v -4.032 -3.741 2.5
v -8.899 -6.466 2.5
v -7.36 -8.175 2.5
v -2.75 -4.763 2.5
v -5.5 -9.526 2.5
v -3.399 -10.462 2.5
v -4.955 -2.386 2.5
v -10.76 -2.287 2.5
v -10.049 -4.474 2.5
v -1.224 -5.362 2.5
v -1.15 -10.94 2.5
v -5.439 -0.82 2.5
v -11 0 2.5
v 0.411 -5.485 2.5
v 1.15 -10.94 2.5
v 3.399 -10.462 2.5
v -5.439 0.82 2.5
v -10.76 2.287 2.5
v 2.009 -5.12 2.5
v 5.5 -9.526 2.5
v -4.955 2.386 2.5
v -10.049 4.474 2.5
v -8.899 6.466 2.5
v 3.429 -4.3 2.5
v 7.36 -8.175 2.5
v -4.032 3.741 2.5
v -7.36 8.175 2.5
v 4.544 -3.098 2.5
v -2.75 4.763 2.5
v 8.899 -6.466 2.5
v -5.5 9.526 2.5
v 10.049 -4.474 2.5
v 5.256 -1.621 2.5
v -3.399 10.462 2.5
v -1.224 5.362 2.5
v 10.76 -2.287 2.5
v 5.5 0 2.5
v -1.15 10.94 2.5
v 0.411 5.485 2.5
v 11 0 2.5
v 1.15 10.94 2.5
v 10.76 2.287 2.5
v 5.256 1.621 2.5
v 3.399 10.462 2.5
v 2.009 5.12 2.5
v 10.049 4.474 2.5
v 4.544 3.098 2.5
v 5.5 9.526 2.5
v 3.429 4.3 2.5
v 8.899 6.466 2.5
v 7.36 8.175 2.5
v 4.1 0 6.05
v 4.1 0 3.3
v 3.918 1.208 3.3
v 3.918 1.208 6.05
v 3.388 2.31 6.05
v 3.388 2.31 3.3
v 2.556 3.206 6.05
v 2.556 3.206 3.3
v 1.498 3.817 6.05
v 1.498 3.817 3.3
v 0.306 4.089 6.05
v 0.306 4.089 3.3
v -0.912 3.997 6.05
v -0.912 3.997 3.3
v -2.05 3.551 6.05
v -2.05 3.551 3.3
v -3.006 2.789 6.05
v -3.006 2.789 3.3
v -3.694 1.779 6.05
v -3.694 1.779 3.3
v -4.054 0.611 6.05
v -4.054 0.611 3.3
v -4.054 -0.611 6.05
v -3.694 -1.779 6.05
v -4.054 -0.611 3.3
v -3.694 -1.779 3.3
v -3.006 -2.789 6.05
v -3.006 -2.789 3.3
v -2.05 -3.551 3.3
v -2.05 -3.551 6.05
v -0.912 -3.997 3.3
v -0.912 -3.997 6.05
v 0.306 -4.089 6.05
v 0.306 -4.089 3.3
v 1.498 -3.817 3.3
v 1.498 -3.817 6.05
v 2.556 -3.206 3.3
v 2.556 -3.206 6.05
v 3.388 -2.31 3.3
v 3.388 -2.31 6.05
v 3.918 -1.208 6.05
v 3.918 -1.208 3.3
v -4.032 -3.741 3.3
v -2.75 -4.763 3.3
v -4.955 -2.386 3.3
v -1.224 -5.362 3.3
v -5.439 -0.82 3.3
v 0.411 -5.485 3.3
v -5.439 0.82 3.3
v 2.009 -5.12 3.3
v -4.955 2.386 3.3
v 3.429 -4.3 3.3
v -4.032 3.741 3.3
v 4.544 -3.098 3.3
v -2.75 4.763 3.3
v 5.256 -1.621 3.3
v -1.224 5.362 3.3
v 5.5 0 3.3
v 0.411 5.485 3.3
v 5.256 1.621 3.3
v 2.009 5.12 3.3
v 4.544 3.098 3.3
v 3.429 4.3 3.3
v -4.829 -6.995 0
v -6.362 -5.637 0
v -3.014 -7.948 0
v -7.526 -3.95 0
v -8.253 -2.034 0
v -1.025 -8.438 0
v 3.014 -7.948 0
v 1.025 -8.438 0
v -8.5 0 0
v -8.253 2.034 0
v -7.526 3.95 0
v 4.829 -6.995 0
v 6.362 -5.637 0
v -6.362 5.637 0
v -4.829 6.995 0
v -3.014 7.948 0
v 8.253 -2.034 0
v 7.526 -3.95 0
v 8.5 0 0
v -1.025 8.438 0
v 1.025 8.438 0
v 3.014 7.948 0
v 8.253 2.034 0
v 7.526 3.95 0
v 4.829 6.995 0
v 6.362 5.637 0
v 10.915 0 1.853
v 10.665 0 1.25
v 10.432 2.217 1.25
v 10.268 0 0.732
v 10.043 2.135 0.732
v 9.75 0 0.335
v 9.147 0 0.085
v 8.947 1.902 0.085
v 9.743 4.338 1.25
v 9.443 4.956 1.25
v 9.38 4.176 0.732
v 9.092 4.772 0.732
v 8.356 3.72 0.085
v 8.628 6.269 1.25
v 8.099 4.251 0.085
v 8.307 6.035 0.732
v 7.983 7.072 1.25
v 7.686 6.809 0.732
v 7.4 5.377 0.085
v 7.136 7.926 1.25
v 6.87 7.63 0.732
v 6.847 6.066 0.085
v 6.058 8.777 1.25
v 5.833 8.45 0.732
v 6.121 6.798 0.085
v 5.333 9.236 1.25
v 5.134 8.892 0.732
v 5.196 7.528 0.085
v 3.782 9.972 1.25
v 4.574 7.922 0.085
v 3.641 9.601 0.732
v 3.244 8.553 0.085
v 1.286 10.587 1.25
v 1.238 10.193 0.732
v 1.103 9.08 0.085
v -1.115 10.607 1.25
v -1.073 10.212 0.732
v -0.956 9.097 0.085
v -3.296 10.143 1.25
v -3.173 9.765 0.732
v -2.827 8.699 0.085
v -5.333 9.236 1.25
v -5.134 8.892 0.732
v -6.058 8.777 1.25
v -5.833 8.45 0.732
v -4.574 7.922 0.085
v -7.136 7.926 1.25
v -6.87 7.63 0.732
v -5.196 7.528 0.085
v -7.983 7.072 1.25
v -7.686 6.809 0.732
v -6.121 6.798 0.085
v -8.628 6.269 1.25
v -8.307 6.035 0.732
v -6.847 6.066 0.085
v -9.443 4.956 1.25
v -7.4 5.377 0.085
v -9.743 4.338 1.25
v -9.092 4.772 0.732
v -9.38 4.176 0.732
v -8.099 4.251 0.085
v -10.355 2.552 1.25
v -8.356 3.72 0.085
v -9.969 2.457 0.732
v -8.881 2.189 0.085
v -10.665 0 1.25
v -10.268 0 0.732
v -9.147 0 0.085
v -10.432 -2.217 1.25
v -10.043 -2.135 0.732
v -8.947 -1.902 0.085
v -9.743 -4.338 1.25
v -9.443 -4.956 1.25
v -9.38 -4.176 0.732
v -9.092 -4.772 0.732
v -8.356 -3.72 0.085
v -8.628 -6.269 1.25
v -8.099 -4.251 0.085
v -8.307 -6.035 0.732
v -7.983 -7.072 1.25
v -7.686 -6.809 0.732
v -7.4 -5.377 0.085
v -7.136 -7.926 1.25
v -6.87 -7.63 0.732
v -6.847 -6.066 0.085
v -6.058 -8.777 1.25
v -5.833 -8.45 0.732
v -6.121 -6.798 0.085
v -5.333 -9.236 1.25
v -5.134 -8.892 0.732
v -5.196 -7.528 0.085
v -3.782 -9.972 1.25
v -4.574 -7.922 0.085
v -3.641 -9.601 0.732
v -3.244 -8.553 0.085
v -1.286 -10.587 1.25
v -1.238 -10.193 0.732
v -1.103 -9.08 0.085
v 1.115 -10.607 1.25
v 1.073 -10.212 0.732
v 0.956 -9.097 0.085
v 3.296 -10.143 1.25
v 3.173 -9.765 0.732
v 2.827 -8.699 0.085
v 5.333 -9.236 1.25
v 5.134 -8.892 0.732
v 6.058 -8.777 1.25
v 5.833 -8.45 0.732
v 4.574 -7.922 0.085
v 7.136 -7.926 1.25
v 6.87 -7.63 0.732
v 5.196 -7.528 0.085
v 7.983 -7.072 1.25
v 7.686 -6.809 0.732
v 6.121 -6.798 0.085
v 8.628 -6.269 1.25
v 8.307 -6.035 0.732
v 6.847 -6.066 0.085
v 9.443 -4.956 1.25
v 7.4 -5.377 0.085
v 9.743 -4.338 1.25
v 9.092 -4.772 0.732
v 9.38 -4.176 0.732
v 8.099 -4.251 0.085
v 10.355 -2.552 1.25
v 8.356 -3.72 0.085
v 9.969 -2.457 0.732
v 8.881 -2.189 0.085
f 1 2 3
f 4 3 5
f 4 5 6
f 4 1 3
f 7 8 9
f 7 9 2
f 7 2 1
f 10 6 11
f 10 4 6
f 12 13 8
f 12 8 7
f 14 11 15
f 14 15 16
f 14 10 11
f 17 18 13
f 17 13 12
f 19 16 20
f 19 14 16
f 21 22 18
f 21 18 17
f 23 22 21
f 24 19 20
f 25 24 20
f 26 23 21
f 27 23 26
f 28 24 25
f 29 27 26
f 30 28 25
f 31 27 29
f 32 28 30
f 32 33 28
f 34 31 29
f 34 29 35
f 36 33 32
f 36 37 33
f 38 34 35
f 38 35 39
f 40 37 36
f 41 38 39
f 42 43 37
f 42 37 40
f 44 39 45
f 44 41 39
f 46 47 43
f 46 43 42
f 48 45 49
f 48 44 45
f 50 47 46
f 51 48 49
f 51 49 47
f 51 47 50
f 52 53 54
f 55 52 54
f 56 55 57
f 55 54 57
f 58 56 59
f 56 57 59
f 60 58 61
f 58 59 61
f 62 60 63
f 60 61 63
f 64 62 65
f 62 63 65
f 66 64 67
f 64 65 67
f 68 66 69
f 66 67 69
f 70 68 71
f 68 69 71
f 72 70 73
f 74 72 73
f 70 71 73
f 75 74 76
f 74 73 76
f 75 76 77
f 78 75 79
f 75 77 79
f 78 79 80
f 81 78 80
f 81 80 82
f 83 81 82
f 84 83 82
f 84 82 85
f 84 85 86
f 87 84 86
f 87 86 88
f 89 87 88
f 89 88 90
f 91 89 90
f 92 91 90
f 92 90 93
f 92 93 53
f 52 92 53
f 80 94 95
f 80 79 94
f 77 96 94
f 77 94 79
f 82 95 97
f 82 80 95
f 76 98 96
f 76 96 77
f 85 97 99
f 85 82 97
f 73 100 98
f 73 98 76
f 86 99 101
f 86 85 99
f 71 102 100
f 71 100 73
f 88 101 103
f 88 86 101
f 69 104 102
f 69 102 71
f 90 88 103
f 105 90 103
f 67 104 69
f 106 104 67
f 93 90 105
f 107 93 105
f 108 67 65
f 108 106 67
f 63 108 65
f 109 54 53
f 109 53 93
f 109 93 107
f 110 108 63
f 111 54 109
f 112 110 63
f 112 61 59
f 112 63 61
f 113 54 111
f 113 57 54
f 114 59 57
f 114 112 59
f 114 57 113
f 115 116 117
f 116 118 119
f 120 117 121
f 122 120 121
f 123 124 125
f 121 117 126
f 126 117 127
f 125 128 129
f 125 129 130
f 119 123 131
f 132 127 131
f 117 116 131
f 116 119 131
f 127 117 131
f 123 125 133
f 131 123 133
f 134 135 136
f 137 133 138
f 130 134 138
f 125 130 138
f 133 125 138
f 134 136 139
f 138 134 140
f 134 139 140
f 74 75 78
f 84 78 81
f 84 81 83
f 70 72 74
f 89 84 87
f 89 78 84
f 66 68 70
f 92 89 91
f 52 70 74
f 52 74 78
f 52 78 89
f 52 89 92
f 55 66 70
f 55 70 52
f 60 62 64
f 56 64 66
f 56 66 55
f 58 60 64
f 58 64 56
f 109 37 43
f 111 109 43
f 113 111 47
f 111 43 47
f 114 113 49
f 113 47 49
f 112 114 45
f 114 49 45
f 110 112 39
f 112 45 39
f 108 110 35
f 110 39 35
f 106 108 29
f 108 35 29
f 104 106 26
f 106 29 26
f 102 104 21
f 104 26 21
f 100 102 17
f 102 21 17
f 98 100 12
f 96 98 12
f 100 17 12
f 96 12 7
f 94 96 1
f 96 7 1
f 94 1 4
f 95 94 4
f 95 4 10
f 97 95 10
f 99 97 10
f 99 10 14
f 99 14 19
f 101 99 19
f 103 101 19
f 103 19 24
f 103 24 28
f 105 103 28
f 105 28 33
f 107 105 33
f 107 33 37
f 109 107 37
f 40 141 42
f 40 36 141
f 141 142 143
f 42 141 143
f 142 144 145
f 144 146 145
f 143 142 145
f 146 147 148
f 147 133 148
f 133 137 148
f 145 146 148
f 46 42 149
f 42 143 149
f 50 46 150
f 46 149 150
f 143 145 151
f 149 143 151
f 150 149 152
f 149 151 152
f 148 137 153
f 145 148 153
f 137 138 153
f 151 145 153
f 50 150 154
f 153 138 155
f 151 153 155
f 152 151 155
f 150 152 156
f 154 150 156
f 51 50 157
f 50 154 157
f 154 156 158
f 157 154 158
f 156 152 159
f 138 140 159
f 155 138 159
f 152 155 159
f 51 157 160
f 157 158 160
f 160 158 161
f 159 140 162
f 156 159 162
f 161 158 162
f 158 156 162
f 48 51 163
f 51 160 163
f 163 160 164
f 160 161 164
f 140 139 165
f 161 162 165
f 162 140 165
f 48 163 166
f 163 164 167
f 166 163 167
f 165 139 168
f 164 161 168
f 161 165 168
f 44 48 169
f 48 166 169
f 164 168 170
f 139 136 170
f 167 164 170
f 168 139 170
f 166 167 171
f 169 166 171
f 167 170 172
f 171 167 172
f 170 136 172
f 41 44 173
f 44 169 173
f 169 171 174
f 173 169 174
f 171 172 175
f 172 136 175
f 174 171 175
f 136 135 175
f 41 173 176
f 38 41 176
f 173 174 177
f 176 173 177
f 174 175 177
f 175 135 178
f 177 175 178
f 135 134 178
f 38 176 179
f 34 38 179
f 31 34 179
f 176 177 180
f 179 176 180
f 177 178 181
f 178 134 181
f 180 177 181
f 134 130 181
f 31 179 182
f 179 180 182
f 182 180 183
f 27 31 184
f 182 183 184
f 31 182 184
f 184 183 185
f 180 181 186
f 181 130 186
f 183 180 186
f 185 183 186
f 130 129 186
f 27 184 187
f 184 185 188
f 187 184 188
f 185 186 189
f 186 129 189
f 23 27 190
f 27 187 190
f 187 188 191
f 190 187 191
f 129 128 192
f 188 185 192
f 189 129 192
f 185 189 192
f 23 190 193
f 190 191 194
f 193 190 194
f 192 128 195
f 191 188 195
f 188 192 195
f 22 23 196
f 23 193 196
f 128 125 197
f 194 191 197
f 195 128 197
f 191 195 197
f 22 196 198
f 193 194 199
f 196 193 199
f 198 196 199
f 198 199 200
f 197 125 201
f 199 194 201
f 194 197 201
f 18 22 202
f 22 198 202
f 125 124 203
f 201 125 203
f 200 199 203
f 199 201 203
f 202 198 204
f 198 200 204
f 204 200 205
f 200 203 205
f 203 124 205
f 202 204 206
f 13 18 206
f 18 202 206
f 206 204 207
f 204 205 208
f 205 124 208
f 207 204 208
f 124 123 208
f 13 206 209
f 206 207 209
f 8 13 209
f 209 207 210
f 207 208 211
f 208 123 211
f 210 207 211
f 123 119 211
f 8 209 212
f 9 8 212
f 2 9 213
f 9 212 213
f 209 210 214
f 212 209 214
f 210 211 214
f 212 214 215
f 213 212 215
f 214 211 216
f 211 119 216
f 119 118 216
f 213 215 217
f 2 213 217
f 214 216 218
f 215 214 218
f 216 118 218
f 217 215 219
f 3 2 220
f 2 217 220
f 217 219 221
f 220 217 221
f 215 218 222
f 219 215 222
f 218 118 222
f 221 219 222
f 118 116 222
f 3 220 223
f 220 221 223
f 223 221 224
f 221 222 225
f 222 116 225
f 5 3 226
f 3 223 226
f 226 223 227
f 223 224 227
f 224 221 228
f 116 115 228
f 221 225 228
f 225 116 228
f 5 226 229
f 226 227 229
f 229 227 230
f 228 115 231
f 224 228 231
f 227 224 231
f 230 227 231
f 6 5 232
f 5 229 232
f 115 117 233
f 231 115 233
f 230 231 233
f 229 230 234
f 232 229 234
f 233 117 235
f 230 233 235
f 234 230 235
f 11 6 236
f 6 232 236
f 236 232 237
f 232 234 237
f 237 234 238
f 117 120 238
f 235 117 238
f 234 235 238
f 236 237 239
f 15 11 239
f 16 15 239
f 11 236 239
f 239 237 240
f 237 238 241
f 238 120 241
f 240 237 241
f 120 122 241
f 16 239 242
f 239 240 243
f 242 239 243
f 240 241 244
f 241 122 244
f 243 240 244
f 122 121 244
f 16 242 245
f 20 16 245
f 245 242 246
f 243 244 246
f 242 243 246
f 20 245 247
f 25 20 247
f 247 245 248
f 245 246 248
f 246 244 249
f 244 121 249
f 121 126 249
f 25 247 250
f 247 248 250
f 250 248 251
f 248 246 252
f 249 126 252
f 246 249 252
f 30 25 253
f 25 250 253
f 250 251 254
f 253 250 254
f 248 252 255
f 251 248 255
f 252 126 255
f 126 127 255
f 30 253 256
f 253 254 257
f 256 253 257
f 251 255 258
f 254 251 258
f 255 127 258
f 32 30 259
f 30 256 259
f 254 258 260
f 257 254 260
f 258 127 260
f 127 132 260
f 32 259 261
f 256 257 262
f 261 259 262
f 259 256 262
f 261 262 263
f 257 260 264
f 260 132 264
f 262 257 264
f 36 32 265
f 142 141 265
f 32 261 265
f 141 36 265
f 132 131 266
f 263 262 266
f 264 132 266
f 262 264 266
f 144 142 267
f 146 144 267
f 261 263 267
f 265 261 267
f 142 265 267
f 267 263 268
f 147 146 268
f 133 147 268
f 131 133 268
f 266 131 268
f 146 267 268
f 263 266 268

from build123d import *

# Parameters (mm, degrees)
F0_R     = 11
F0_R_2   = 5.5
F1_DEPTH = 2.5
F0_R_3   = 4.1
F2_DEPTH = 3.3
F3_DEPTH = 6.05
F4_R     = 2.49999


# Not quite as in the source:
# - a fillet or chamfer is up to 0.001 mm smaller than in the source, because OpenCascade refuses the exact size


with BuildPart() as f1:
    # F0 (on Top) → F1 (new body)
    with BuildSketch(Plane.XY):
        Circle(F0_R)
        Circle(F0_R_2, mode=Mode.SUBTRACT)
    extrude(amount=F1_DEPTH)

    # F0 (on Top) → F2 (join, through all)
    with BuildSketch(Plane.XY):
        Circle(F0_R_2)
        Circle(F0_R_3, mode=Mode.SUBTRACT)
    extrude(amount=F2_DEPTH)

    # F0 (on Top) → F3 (join, through all)
    with BuildSketch(Plane.XY):
        Circle(F0_R_3)
    extrude(amount=F3_DEPTH)

    # F4 (radius 2.5 in the source; OpenCascade refuses exactly that, so slightly less here)
    f4_edges = [f1.edges().sort_by_distance(p)[0] for p in [
        (-11, 0, 0),
    ]]
    fillet(f4_edges, radius=F4_R)


solid = f1.part
